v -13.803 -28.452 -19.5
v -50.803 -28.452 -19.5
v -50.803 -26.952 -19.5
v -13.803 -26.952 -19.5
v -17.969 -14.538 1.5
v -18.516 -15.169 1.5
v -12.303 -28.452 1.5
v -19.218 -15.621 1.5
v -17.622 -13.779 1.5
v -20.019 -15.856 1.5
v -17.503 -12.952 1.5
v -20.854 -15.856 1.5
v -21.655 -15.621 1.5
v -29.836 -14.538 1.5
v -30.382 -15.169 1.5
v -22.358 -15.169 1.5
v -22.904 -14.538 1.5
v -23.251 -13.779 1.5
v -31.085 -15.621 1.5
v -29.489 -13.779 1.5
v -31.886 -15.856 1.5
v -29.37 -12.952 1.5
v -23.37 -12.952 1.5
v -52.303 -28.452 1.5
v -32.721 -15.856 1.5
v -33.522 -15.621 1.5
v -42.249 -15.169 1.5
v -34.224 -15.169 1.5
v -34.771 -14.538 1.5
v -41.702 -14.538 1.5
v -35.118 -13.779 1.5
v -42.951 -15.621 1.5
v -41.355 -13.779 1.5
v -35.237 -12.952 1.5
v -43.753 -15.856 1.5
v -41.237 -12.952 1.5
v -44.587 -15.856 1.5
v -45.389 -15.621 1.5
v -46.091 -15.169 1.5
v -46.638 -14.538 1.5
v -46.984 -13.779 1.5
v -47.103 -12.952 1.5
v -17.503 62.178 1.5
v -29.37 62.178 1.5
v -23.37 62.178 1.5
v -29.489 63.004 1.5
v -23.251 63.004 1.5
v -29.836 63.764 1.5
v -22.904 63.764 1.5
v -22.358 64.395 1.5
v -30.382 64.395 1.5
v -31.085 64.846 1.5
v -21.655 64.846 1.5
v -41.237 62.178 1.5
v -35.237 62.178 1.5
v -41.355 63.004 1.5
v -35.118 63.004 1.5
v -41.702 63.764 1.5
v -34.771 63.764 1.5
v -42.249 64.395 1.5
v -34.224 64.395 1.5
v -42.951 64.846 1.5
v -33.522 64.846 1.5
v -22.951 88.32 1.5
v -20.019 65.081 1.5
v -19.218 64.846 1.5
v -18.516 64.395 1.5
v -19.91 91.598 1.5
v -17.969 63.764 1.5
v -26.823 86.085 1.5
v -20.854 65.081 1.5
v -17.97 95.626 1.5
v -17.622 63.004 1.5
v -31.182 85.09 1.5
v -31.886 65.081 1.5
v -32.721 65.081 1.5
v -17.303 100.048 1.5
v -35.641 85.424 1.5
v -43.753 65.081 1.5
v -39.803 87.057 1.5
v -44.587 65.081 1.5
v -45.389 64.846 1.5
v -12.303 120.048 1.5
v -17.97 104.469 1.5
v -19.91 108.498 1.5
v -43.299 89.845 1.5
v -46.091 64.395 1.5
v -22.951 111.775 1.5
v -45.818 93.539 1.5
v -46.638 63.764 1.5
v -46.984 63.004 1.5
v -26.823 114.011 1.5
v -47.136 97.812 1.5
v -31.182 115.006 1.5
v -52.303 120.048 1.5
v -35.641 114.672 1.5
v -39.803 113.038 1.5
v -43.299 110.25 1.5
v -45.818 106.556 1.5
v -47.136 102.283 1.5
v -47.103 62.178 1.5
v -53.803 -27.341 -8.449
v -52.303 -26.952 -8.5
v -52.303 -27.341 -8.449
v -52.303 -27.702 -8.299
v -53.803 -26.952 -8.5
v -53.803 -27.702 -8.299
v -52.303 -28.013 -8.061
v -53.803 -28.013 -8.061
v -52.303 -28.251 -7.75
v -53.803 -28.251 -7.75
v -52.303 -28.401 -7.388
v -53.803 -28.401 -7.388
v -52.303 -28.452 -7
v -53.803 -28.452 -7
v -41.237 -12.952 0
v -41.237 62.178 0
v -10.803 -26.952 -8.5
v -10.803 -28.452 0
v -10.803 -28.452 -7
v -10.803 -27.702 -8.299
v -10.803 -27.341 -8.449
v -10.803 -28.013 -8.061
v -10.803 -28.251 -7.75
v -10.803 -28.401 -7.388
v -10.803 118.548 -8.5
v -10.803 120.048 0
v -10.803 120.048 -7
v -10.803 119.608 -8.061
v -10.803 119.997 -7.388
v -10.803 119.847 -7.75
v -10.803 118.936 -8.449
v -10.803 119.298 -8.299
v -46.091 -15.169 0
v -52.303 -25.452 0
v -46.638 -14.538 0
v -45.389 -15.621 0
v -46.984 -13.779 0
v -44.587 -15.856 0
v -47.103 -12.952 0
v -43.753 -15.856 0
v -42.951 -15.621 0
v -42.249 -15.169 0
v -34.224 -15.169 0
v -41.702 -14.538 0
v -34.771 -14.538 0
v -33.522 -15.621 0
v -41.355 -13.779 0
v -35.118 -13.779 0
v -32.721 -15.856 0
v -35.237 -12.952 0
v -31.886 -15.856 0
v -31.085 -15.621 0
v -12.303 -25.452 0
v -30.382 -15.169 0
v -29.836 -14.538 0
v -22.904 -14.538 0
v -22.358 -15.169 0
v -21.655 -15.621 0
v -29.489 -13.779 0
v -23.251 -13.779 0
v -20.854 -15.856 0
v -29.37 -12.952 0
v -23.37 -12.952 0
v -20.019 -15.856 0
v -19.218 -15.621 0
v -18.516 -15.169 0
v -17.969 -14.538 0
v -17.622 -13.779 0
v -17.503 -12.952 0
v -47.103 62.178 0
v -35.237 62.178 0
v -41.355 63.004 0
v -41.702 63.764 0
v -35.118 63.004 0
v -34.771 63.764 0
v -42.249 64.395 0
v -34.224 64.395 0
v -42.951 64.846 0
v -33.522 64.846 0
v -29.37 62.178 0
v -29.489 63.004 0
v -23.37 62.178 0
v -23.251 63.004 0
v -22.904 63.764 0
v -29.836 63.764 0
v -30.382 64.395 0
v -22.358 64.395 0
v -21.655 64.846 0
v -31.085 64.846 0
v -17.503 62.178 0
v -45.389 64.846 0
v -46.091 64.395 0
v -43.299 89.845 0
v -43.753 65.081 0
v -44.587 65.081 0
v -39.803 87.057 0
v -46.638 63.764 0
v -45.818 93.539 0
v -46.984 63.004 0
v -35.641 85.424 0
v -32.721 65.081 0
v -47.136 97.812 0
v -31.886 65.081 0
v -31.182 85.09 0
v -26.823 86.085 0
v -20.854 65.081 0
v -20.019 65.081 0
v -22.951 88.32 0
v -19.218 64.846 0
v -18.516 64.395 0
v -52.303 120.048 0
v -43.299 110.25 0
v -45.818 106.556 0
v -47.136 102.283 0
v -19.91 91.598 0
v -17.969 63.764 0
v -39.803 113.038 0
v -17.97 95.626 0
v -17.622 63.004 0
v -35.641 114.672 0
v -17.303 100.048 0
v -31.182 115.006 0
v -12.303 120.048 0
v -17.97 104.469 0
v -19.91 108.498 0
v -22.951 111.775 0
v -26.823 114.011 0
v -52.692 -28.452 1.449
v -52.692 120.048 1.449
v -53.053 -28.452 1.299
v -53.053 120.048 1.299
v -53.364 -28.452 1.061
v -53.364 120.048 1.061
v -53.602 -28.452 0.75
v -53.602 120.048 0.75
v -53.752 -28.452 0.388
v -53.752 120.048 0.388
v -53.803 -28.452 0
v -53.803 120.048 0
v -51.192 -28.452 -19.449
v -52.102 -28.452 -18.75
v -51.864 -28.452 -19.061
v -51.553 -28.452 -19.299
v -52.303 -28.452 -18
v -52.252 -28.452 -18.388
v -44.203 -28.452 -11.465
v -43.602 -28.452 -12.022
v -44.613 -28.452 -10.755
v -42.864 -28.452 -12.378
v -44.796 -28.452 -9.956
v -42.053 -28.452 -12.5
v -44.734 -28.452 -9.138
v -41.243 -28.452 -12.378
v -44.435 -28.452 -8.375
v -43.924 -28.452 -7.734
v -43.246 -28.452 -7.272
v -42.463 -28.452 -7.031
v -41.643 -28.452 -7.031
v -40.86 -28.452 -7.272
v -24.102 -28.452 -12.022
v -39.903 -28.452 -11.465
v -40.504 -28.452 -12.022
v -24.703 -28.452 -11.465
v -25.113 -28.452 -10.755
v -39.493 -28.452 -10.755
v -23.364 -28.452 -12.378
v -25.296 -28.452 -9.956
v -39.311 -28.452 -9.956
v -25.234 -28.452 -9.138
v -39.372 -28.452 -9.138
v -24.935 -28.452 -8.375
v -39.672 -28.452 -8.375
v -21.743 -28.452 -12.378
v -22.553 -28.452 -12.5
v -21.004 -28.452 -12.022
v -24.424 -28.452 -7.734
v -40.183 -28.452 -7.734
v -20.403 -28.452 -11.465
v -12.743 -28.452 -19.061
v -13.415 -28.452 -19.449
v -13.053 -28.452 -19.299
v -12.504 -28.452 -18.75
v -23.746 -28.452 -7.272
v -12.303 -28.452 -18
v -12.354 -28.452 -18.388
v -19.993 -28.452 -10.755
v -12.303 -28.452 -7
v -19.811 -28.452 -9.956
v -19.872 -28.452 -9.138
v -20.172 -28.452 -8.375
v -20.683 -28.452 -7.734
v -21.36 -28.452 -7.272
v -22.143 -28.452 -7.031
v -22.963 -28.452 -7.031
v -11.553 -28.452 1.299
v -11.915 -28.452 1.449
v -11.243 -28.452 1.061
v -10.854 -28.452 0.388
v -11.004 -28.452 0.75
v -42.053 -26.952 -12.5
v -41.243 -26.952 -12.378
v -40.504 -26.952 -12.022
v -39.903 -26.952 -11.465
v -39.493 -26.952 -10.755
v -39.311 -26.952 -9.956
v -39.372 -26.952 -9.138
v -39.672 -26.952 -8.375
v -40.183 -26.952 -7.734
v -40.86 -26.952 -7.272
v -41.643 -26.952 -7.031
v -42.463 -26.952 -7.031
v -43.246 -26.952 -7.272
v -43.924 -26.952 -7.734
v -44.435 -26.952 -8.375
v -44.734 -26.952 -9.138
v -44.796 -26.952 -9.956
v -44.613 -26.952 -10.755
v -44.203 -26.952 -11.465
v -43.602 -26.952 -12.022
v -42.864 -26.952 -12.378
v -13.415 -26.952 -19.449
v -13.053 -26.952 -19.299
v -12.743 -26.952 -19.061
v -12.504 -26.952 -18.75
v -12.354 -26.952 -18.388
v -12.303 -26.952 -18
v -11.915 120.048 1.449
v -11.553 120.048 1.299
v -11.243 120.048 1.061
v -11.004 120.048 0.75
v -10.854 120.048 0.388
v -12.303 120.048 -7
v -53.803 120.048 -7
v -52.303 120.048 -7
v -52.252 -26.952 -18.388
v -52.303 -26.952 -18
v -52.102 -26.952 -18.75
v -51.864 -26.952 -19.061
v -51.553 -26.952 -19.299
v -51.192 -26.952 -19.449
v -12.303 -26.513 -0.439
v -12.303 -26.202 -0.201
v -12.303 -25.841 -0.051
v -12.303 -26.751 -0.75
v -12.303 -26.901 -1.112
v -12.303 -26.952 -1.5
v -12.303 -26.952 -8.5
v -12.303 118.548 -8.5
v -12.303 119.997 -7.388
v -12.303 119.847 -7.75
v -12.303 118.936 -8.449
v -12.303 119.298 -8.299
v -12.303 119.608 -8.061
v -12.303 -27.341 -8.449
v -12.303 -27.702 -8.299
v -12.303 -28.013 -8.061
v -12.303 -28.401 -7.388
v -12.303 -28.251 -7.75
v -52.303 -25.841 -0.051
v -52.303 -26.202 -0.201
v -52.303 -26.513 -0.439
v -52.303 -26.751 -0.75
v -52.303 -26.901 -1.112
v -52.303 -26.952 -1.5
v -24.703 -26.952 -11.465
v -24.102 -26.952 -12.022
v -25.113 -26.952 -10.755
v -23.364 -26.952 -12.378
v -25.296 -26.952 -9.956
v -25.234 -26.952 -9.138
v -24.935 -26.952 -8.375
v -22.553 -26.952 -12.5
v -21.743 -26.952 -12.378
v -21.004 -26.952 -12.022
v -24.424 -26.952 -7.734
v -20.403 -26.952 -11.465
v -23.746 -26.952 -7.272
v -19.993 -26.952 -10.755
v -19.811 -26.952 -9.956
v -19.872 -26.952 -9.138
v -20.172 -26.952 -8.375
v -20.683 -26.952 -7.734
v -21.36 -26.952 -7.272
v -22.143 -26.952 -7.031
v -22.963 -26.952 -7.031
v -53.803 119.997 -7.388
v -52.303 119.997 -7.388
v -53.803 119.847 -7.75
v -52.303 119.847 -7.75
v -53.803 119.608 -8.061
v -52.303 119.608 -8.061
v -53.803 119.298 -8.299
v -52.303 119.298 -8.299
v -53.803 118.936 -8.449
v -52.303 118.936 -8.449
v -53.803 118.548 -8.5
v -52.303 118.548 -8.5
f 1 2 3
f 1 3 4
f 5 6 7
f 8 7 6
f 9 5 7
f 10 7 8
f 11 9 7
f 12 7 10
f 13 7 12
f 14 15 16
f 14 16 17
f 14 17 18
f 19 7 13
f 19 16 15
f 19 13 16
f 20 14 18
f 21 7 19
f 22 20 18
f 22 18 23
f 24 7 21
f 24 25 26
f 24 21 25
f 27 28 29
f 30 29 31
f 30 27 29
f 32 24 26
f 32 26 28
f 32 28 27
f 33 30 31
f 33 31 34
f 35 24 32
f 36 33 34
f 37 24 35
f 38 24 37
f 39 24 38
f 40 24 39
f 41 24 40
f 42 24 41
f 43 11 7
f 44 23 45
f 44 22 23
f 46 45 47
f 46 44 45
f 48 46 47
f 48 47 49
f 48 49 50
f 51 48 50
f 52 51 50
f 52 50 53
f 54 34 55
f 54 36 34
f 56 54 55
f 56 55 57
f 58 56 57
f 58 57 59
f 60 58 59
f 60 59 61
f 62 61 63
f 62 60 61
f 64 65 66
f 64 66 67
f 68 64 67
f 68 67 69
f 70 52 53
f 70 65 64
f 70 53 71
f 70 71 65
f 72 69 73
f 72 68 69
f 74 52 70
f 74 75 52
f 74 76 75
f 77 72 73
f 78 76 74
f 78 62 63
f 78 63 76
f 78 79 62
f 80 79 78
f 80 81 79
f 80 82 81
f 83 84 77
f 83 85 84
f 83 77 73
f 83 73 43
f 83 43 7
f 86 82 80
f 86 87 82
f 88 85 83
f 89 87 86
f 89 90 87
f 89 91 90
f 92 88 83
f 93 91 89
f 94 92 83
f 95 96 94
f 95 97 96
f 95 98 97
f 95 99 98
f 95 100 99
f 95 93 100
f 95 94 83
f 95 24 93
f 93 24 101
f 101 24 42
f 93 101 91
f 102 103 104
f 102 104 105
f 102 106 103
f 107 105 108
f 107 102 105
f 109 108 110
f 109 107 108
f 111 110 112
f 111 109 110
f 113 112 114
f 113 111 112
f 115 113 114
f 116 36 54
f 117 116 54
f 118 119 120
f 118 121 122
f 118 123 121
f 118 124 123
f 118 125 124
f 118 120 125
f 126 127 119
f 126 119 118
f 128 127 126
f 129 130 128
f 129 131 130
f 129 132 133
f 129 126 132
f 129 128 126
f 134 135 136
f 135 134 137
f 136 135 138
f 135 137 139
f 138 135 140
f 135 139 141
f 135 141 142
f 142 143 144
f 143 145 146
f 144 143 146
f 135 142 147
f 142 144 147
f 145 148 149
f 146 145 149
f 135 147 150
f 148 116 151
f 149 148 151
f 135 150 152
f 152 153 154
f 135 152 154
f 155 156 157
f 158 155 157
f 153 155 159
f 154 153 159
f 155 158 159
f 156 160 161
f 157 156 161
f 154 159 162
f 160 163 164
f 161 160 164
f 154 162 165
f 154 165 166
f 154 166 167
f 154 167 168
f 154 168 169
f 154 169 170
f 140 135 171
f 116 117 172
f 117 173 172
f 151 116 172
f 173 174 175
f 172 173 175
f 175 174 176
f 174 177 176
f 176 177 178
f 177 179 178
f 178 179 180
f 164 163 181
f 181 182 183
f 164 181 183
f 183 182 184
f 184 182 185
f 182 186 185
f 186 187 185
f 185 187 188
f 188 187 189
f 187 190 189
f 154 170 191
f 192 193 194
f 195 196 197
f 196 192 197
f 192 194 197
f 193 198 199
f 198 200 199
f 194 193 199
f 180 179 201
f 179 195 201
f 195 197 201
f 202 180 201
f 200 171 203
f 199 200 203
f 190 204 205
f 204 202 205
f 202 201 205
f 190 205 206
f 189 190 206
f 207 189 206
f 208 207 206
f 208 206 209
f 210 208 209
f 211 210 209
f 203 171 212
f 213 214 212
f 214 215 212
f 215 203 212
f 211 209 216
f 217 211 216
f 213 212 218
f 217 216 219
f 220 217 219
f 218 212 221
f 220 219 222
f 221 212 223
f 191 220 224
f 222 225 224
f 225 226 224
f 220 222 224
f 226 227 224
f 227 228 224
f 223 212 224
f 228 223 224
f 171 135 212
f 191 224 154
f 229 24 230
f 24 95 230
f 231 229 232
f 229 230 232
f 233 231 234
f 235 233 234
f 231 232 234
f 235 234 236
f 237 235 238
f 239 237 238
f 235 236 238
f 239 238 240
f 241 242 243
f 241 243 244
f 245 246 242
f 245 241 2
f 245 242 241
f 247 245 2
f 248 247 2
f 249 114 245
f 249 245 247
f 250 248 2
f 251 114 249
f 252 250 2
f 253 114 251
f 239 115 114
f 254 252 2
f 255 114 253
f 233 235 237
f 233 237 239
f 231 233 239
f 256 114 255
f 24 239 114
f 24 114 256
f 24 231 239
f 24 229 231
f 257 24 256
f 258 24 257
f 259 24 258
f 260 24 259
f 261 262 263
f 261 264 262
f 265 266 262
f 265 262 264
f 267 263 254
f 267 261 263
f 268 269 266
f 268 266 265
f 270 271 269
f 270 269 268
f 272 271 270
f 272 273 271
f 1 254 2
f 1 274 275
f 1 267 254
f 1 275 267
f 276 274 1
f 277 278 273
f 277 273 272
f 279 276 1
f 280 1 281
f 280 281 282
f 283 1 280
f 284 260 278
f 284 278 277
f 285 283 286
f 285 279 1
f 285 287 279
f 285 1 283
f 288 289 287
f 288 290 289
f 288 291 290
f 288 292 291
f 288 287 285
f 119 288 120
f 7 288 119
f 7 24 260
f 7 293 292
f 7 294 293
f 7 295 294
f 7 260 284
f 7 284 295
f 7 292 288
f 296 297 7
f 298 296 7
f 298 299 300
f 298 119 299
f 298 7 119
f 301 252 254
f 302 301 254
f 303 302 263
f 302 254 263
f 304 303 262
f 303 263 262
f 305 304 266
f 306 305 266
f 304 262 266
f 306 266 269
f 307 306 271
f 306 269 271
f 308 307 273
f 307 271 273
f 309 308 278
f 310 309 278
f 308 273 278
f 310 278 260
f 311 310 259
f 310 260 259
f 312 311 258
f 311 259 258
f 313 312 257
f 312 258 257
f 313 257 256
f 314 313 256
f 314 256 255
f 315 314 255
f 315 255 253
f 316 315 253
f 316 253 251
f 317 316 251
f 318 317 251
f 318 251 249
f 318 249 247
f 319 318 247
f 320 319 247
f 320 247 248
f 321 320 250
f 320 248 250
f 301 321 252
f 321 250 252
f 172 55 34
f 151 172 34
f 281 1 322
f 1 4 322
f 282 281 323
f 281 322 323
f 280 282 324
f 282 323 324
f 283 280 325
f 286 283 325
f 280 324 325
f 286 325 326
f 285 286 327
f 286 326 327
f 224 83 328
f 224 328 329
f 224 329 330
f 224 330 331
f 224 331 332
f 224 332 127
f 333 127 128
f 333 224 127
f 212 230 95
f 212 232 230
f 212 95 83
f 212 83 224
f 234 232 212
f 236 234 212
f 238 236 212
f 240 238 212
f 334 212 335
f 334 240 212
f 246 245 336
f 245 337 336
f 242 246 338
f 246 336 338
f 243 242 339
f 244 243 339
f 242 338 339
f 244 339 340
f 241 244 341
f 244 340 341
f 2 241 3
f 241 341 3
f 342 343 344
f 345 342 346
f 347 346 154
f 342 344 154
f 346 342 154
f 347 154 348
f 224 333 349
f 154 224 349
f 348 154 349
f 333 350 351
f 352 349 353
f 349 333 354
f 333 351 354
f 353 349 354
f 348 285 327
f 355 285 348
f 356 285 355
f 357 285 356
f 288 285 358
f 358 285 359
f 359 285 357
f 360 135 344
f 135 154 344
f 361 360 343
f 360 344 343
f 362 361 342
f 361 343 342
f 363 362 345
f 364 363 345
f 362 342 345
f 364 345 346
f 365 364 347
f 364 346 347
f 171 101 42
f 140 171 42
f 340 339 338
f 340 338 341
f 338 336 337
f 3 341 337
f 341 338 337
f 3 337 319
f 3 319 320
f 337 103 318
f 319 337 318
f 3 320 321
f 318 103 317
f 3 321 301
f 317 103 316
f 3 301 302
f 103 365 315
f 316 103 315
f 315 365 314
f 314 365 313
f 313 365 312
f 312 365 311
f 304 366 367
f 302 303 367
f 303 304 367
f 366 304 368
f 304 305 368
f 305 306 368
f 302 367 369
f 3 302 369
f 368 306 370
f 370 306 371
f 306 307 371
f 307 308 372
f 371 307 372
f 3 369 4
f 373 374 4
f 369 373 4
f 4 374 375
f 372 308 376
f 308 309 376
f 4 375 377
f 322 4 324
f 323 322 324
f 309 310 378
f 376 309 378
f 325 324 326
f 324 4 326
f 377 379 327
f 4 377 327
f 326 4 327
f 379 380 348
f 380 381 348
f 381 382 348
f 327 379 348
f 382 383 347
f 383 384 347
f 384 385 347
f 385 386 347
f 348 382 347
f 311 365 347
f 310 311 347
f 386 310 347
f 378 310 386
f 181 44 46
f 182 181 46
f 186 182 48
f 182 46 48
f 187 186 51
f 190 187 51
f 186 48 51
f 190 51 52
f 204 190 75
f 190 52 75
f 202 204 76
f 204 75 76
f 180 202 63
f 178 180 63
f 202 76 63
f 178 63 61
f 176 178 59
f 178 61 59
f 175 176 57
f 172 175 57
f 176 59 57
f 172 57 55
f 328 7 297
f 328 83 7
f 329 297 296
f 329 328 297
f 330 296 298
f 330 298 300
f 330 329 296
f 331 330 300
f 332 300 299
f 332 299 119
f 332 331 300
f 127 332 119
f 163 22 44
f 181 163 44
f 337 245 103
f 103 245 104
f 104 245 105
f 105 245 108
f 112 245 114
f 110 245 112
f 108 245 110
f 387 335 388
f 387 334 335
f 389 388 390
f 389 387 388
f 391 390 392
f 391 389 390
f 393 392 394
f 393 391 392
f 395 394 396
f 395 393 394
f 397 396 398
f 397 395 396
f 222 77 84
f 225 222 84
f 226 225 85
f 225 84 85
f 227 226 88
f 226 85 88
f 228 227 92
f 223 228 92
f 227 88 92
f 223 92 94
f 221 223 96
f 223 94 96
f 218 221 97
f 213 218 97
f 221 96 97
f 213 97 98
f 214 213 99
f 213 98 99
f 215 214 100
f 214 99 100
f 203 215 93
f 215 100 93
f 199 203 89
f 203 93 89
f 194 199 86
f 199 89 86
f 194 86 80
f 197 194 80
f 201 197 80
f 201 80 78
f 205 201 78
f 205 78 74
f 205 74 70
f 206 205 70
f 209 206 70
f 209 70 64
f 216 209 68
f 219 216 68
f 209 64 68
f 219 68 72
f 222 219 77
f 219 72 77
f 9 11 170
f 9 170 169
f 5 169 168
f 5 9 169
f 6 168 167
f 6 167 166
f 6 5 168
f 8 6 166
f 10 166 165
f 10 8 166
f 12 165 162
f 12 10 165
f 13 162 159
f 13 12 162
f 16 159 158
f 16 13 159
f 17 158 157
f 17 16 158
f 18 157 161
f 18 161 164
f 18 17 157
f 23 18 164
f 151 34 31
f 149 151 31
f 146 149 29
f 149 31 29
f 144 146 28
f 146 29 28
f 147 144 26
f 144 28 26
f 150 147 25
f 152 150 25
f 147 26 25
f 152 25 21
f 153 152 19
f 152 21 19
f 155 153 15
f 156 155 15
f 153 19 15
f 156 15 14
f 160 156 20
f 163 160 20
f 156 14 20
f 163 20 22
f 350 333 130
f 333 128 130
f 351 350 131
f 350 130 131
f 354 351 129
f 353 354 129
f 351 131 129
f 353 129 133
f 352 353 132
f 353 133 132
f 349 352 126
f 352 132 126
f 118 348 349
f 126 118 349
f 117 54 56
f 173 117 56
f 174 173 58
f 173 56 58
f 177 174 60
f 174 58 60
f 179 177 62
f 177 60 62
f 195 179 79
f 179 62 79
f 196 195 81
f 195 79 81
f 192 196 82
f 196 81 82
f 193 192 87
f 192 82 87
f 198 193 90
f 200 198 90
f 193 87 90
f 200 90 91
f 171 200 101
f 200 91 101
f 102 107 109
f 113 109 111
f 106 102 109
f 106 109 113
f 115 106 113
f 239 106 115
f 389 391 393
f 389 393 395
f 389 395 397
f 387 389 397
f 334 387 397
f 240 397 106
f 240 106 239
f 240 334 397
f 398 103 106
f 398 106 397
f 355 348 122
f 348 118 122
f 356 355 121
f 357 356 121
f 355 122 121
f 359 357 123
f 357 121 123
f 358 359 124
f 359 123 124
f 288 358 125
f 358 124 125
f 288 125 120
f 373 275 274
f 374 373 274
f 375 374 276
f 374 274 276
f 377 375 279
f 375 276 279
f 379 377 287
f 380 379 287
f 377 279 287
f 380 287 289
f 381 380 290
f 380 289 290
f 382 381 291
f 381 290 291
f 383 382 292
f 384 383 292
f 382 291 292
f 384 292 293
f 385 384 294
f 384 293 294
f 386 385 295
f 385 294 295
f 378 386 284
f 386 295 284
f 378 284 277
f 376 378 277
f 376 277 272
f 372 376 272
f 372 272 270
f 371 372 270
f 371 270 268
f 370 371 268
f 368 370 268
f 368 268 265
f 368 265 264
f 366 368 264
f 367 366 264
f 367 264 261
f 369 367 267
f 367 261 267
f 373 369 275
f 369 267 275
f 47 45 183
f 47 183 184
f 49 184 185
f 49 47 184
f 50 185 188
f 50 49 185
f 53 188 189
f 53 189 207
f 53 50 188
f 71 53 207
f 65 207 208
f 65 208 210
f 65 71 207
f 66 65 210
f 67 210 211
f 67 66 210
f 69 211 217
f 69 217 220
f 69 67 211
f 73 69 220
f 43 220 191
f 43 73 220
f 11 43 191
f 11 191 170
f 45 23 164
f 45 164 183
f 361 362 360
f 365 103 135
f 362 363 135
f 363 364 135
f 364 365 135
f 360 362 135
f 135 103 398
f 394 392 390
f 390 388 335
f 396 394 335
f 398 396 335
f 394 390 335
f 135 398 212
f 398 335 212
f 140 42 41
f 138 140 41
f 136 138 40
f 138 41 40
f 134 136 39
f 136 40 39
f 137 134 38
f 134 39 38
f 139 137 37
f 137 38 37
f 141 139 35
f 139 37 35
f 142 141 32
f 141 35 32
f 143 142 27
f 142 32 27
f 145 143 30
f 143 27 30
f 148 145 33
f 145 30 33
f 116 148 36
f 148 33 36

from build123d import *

# Parameters (mm, degrees)
CROQUIS1_W              = 40
CROQUIS1_H              = 148.5
SALIENTE_EXTRUIR1_DEPTH = 1.5
CROQUIS2_R              = 15
CORTAR_EXTRUIR1_DEPTH   = 1.5
CORTAR_EXTRUIR2_DEPTH   = 1.5
CROQUIS4_W              = 10
CROQUIS4_H              = 148.5
SALIENTE_EXTRUIR2_DEPTH = 1.5
CROQUIS5_W              = 10
CROQUIS5_H              = 148.5
SALIENTE_EXTRUIR3_DEPTH = 1.5
REDONDEO1_R             = 1.5
CROQUIS7_W              = 40
CROQUIS7_H              = 21
SALIENTE_EXTRUIR4_DEPTH = 1.5
REDONDEO2_R             = 1.5
CROQUIS8_R              = 2.75
CORTAR_EXTRUIR3_DEPTH   = 1.5
REDONDEO4_R             = 1.5


with BuildPart() as part:
    # Croquis1 → Saliente-Extruir1 (new body)
    with BuildSketch(Plane.XY):
        with Locations((-32.303310274, 45.797728257)):
            Rectangle(CROQUIS1_W, CROQUIS1_H)
    extrude(amount=SALIENTE_EXTRUIR1_DEPTH)

    # Croquis2 → Cortar-Extruir1 (cut)
    with BuildSketch(Plane.XY.offset(1.5)):
        with Locations((-32.303310274, 100.047728257)):
            Circle(CROQUIS2_R)
    extrude(amount=-CORTAR_EXTRUIR1_DEPTH, mode=Mode.SUBTRACT)

    # Croquis3 → Cortar-Extruir2 (cut)
    with BuildSketch(Plane.XY.offset(1.5)):
        with BuildLine():
            Line((-41.236643608, -12.952271743), (-41.236643608, 62.177728257))
            ThreePointArc((-41.236643608, 62.177728257), (-44.169976941, 65.11106159), (-47.103310274, 62.177728257))
            Line((-47.103310274, 62.177728257), (-47.103310274, -12.952271743))
            ThreePointArc((-47.103310274, -12.952271743), (-44.169976941, -15.885605076), (-41.236643608, -12.952271743))
        make_face()
        with BuildLine():
            Line((-29.369976941, -12.952271743), (-29.369976941, 62.177728257))
            ThreePointArc((-29.369976941, 62.177728257), (-32.303310274, 65.11106159), (-35.236643608, 62.177728257))
            Line((-35.236643608, 62.177728257), (-35.236643608, -12.952271743))
            ThreePointArc((-35.236643608, -12.952271743), (-32.303310274, -15.885605076), (-29.369976941, -12.952271743))
        make_face()
        with BuildLine():
            Line((-17.503310274, 62.177728257), (-17.503310274, -12.952271743))
            ThreePointArc((-17.503310274, -12.952271743), (-20.436643608, -15.885605076), (-23.369976941, -12.952271743))
            Line((-23.369976941, -12.952271743), (-23.369976941, 62.177728257))
            ThreePointArc((-23.369976941, 62.177728257), (-20.436643608, 65.11106159), (-17.503310274, 62.177728257))
        make_face()
    extrude(amount=-CORTAR_EXTRUIR2_DEPTH, mode=Mode.SUBTRACT)

    # Croquis4 → Saliente-Extruir2 (add)
    with BuildSketch(Plane.ZY.offset(52.303310274)):
        with Locations((-3.5, 45.797728257)):
            Rectangle(CROQUIS4_W, CROQUIS4_H)
    extrude(amount=SALIENTE_EXTRUIR2_DEPTH)

    # Croquis5 → Saliente-Extruir3 (add)
    with BuildSketch(Plane(origin=(-12.303310274, 0, 0), x_dir=(0, 0, -1), z_dir=(1, 0, 0))):
        with Locations((3.5, 45.797728257)):
            Rectangle(CROQUIS5_W, CROQUIS5_H)
    extrude(amount=SALIENTE_EXTRUIR3_DEPTH)

    # Redondeo1
    redondeo1_edges = [part.edges().sort_by_distance(p)[0] for p in [
        (-53.803310274, 45.797728257, 1.5),
        (-10.803310274, 45.797728257, 1.5),
    ]]
    fillet(redondeo1_edges, radius=REDONDEO1_R)

    # Croquis7 → Saliente-Extruir4 (add)
    with BuildSketch(Plane.XZ.offset(28.452271743)):
        with Locations((-32.303310274, -9)):
            Rectangle(CROQUIS7_W, CROQUIS7_H)
    extrude(amount=-SALIENTE_EXTRUIR4_DEPTH)

    # Redondeo2
    redondeo2_edges = [part.edges().sort_by_distance(p)[0] for p in [
        (-32.303310274, -26.952271743, 0),
    ]]
    fillet(redondeo2_edges, radius=REDONDEO2_R)

    # Croquis8 → Cortar-Extruir3 (cut)
    with BuildSketch(Plane(origin=(0, -28.452271743, 0), x_dir=(-1, 0, 0), z_dir=(0, -1, 0))):
        with Locations(Location((42.053310274, 9.75, 0), (0, 0, 90))):
            Circle(CROQUIS8_R)
        with Locations(Location((22.553310274, 9.75, 0), (0, 0, 90))):
            Circle(CROQUIS8_R)
    extrude(amount=-CORTAR_EXTRUIR3_DEPTH, mode=Mode.SUBTRACT)

    # Redondeo4
    redondeo4_edges = [part.edges().sort_by_distance(p)[0] for p in [
        (-52.303310274, -27.702271743, -19.5),
        (-12.303310274, -27.702271743, -19.5),
        (-53.053310274, -28.452271743, -8.5),
        (-53.053310274, 120.047728257, -8.5),
        (-11.553310274, -28.452271743, -8.5),
        (-11.553310274, 120.047728257, -8.5),
    ]]
    fillet(redondeo4_edges, radius=REDONDEO4_R)


solid = part.part
